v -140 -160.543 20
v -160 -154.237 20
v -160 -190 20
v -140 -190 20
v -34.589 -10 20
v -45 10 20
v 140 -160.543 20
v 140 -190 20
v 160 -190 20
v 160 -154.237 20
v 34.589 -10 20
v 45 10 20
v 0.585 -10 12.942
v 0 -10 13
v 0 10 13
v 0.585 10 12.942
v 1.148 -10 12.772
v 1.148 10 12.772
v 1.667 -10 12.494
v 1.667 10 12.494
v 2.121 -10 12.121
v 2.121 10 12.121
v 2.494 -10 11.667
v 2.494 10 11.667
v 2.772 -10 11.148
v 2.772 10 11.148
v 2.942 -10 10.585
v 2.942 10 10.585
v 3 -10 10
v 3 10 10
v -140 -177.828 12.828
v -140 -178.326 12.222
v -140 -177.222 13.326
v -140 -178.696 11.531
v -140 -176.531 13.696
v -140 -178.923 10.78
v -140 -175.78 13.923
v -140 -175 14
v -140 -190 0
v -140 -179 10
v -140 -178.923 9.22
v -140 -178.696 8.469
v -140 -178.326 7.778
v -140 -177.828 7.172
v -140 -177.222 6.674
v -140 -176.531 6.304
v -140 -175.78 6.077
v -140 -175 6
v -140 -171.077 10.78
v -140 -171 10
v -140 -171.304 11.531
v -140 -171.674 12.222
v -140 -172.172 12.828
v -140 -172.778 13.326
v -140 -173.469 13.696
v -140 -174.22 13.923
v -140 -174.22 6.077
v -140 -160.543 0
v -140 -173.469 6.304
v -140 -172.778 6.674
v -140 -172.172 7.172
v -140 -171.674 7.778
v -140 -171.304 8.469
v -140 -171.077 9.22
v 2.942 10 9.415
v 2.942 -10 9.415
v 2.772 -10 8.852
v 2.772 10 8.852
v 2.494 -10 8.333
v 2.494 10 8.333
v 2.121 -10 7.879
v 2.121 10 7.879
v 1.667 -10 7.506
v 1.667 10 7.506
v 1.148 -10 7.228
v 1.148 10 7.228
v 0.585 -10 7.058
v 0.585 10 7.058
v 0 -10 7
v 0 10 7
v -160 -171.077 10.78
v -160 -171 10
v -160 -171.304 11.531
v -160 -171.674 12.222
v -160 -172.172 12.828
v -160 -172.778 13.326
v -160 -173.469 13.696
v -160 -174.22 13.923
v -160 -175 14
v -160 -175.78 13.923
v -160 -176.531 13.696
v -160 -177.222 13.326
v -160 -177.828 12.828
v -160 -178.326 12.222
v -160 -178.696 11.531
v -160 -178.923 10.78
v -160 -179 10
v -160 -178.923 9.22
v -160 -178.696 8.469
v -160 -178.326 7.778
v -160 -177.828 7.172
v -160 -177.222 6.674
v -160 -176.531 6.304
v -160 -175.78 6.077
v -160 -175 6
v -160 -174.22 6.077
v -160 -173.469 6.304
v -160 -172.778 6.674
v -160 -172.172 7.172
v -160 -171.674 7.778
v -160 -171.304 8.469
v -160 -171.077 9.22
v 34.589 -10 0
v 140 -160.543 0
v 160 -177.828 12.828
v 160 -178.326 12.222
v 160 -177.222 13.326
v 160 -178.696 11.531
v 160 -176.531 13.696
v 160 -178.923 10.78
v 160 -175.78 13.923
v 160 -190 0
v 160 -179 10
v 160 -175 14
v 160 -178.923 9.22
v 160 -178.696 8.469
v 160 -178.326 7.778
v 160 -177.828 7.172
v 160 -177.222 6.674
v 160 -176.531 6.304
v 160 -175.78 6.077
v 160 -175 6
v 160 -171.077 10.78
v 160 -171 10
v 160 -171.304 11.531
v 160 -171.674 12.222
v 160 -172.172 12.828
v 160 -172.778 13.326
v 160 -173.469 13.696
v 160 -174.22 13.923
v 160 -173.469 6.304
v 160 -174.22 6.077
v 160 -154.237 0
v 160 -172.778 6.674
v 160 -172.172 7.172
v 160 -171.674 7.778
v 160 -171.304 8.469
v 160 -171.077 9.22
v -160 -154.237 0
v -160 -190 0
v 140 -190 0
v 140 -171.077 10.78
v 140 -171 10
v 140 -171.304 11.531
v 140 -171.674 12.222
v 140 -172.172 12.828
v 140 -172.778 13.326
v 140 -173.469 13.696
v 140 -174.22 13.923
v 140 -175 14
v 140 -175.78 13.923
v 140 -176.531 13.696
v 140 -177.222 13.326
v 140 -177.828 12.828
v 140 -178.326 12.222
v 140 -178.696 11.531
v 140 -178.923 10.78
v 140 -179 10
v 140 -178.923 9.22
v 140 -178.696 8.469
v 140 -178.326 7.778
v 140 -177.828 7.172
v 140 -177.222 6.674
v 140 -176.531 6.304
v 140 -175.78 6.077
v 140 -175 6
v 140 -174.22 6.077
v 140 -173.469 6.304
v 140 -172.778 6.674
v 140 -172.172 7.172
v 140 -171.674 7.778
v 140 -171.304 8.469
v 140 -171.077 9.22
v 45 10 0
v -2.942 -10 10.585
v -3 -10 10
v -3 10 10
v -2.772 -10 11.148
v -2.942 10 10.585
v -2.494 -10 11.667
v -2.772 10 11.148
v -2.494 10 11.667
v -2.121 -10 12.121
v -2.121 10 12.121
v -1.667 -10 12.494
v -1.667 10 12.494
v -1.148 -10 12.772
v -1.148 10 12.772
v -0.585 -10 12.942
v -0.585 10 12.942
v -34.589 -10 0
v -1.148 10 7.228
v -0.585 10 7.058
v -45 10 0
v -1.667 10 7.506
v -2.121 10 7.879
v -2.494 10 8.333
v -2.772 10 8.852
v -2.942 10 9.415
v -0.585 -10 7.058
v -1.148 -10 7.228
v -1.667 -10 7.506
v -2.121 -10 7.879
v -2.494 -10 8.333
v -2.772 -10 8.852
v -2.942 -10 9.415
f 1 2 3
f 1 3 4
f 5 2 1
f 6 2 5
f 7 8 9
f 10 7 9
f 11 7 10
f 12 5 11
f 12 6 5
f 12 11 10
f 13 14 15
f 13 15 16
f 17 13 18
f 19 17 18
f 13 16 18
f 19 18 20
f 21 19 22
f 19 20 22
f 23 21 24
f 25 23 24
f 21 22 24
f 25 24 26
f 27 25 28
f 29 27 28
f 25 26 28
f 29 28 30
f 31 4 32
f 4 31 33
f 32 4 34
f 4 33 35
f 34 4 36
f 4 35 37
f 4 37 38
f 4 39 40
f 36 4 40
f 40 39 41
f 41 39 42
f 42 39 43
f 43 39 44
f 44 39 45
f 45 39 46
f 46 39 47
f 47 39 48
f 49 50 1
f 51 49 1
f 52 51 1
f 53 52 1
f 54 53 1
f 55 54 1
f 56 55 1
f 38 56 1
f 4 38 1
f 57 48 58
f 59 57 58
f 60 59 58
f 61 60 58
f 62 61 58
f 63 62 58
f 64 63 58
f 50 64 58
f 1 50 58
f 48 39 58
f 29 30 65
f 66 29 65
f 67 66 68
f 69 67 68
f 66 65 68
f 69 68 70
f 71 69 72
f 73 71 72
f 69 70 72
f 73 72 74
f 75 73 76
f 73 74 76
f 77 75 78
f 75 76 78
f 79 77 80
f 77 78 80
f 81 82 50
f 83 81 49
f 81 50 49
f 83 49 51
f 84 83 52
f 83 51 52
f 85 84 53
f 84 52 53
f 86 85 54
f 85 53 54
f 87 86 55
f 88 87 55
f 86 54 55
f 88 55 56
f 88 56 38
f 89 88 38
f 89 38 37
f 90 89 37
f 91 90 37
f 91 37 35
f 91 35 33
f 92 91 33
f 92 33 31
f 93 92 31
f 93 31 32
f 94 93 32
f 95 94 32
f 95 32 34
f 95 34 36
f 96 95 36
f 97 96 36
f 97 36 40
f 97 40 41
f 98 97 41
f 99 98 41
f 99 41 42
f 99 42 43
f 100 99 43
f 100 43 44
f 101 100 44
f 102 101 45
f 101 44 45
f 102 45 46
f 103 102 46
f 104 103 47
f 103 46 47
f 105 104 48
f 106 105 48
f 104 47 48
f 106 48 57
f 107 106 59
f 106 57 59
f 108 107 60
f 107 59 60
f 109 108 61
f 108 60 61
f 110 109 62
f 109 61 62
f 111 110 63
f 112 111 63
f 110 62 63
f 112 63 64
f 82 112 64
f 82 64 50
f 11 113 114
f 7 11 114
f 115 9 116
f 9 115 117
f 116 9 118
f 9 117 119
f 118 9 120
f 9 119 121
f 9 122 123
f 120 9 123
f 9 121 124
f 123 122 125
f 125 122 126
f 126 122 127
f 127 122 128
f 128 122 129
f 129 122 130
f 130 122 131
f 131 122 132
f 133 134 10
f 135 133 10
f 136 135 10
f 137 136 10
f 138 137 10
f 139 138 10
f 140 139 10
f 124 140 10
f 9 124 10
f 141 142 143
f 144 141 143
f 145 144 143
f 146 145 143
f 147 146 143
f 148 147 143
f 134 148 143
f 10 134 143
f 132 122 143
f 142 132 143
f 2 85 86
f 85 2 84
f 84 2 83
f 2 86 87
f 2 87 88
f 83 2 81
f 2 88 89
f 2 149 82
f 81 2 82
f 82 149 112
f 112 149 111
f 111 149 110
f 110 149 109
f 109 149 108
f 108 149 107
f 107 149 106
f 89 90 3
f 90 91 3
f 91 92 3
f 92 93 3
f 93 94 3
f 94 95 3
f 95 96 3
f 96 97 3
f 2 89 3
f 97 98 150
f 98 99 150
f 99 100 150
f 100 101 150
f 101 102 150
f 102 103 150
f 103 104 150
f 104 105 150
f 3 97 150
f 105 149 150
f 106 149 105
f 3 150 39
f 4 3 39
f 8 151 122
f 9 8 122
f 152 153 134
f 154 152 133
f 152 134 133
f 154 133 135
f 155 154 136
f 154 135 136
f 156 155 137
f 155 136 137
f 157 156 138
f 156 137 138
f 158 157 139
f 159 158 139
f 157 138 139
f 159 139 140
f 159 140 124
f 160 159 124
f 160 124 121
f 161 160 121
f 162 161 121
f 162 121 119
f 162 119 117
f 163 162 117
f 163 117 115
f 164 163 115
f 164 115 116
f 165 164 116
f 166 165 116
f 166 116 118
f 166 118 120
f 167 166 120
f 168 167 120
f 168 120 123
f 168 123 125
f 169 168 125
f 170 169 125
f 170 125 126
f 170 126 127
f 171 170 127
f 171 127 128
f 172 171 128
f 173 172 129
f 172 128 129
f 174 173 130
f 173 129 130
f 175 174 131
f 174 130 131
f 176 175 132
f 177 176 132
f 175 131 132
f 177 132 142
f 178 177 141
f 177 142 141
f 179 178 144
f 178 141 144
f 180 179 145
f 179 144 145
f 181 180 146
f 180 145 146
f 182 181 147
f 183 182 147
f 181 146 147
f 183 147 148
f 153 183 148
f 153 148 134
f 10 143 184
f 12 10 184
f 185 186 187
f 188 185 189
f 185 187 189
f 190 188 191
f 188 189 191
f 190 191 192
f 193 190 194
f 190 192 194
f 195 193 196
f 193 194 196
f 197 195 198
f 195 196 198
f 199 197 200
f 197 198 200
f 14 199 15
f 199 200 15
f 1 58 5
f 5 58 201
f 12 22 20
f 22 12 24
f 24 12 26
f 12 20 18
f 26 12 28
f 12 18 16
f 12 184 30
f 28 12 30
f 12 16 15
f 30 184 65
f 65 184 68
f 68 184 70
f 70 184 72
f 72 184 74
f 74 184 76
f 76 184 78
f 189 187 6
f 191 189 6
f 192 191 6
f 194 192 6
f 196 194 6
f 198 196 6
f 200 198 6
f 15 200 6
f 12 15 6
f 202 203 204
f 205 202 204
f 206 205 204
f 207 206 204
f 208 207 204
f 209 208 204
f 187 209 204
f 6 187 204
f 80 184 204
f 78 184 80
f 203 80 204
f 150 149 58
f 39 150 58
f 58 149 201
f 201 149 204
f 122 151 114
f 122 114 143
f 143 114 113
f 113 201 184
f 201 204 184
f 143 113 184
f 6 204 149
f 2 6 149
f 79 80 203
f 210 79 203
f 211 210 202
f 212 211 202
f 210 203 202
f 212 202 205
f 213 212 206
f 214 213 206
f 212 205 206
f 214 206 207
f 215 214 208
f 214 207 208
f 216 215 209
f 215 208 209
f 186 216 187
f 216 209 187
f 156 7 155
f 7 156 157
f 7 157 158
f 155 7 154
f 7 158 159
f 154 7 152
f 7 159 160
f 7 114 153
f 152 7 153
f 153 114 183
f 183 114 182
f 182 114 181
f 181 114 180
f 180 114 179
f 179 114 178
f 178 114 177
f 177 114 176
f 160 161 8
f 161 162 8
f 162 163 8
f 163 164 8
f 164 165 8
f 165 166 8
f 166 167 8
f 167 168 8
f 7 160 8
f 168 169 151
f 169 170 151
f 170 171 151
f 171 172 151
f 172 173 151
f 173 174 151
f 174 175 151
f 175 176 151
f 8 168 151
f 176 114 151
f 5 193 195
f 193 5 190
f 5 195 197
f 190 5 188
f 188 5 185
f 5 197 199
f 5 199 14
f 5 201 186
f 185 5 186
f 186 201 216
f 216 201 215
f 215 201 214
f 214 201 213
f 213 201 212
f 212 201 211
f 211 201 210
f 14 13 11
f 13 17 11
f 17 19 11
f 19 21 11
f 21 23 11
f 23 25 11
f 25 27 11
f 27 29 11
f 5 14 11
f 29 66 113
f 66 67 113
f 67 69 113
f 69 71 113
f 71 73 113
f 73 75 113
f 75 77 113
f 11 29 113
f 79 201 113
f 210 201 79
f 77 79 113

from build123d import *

# Parameters (mm, degrees)
BOSS_EXTRUDE1_DEPTH = 20
CUT_EXTRUDE1_REACH  = 374.693
SKETCH2_R           = 4
CUT_EXTRUDE2_DEPTH  = 20


with BuildPart() as part:
    # Sketch1 → Boss-Extrude1 (new body)
    with BuildSketch(Plane.XY):
        Polygon((0, -10), (34.588658989, -10), (140, -160.542996553), (140, -190), (160, -190), (160, -154.237020775), (45, 10), (0, 10), (-45, 10), (-160, -154.237020775), (-160, -190), (-140, -190), (-140, -160.542996553), (-34.588658989, -10), align=None)
    extrude(amount=BOSS_EXTRUDE1_DEPTH)

    # Cut-Extrude1: up to this face of the body (flat: up to its plane)
    cut_extrude1_end = Plane(part.part.faces().sort_by_distance((-160, -172.118510388, 10))[0])
    # Sketch2 → Cut-Extrude1 (cut, up to the picked face)
    with BuildSketch(Plane(origin=(160, 0, 0), x_dir=(0, 0, -1), z_dir=(1, 0, 0)), mode=Mode.PRIVATE) as cut_extrude1_sk1:
        with Locations(Location((-10, -175, 0), (0, 0, 90))):
            Circle(SKETCH2_R)
    cut_extrude1_tool1 = split(extrude(cut_extrude1_sk1.sketch, amount=-CUT_EXTRUDE1_REACH, mode=Mode.PRIVATE), bisect_by=cut_extrude1_end, keep=Keep.BOTH, mode=Mode.PRIVATE)
    add(cut_extrude1_tool1.solids().sort_by(Axis((160, -175, 10), (-1, 0, 0)))[0], mode=Mode.SUBTRACT)

    # Sketch3 → Cut-Extrude2 (cut)
    with BuildSketch(Plane(origin=(0, 10, 0), x_dir=(1, 0, 0), z_dir=(0, 1, 0))):
        with BuildLine():
            ThreePointArc((3, -10), (2.121320344, -7.878679656), (0, -7))
            Line((0, -7), (0, -10))
            Line((0, -10), (3, -10))
        make_face()
        with BuildLine():
            Line((0, -10), (0, -7))
            ThreePointArc((0, -7), (-2.121320344, -7.878679656), (-3, -10))
            Line((-3, -10), (0, -10))
        make_face()
        with BuildLine():
            Line((3, -10), (0, -10))
            Line((0, -10), (0, -13))
            ThreePointArc((0, -13), (2.121320344, -12.121320344), (3, -10))
        make_face()
        with BuildLine():
            Line((0, -13), (0, -10))
            Line((0, -10), (-3, -10))
            ThreePointArc((-3, -10), (-2.121320344, -12.121320344), (0, -13))
        make_face()
    extrude(amount=-CUT_EXTRUDE2_DEPTH, mode=Mode.SUBTRACT)


solid = part.part
